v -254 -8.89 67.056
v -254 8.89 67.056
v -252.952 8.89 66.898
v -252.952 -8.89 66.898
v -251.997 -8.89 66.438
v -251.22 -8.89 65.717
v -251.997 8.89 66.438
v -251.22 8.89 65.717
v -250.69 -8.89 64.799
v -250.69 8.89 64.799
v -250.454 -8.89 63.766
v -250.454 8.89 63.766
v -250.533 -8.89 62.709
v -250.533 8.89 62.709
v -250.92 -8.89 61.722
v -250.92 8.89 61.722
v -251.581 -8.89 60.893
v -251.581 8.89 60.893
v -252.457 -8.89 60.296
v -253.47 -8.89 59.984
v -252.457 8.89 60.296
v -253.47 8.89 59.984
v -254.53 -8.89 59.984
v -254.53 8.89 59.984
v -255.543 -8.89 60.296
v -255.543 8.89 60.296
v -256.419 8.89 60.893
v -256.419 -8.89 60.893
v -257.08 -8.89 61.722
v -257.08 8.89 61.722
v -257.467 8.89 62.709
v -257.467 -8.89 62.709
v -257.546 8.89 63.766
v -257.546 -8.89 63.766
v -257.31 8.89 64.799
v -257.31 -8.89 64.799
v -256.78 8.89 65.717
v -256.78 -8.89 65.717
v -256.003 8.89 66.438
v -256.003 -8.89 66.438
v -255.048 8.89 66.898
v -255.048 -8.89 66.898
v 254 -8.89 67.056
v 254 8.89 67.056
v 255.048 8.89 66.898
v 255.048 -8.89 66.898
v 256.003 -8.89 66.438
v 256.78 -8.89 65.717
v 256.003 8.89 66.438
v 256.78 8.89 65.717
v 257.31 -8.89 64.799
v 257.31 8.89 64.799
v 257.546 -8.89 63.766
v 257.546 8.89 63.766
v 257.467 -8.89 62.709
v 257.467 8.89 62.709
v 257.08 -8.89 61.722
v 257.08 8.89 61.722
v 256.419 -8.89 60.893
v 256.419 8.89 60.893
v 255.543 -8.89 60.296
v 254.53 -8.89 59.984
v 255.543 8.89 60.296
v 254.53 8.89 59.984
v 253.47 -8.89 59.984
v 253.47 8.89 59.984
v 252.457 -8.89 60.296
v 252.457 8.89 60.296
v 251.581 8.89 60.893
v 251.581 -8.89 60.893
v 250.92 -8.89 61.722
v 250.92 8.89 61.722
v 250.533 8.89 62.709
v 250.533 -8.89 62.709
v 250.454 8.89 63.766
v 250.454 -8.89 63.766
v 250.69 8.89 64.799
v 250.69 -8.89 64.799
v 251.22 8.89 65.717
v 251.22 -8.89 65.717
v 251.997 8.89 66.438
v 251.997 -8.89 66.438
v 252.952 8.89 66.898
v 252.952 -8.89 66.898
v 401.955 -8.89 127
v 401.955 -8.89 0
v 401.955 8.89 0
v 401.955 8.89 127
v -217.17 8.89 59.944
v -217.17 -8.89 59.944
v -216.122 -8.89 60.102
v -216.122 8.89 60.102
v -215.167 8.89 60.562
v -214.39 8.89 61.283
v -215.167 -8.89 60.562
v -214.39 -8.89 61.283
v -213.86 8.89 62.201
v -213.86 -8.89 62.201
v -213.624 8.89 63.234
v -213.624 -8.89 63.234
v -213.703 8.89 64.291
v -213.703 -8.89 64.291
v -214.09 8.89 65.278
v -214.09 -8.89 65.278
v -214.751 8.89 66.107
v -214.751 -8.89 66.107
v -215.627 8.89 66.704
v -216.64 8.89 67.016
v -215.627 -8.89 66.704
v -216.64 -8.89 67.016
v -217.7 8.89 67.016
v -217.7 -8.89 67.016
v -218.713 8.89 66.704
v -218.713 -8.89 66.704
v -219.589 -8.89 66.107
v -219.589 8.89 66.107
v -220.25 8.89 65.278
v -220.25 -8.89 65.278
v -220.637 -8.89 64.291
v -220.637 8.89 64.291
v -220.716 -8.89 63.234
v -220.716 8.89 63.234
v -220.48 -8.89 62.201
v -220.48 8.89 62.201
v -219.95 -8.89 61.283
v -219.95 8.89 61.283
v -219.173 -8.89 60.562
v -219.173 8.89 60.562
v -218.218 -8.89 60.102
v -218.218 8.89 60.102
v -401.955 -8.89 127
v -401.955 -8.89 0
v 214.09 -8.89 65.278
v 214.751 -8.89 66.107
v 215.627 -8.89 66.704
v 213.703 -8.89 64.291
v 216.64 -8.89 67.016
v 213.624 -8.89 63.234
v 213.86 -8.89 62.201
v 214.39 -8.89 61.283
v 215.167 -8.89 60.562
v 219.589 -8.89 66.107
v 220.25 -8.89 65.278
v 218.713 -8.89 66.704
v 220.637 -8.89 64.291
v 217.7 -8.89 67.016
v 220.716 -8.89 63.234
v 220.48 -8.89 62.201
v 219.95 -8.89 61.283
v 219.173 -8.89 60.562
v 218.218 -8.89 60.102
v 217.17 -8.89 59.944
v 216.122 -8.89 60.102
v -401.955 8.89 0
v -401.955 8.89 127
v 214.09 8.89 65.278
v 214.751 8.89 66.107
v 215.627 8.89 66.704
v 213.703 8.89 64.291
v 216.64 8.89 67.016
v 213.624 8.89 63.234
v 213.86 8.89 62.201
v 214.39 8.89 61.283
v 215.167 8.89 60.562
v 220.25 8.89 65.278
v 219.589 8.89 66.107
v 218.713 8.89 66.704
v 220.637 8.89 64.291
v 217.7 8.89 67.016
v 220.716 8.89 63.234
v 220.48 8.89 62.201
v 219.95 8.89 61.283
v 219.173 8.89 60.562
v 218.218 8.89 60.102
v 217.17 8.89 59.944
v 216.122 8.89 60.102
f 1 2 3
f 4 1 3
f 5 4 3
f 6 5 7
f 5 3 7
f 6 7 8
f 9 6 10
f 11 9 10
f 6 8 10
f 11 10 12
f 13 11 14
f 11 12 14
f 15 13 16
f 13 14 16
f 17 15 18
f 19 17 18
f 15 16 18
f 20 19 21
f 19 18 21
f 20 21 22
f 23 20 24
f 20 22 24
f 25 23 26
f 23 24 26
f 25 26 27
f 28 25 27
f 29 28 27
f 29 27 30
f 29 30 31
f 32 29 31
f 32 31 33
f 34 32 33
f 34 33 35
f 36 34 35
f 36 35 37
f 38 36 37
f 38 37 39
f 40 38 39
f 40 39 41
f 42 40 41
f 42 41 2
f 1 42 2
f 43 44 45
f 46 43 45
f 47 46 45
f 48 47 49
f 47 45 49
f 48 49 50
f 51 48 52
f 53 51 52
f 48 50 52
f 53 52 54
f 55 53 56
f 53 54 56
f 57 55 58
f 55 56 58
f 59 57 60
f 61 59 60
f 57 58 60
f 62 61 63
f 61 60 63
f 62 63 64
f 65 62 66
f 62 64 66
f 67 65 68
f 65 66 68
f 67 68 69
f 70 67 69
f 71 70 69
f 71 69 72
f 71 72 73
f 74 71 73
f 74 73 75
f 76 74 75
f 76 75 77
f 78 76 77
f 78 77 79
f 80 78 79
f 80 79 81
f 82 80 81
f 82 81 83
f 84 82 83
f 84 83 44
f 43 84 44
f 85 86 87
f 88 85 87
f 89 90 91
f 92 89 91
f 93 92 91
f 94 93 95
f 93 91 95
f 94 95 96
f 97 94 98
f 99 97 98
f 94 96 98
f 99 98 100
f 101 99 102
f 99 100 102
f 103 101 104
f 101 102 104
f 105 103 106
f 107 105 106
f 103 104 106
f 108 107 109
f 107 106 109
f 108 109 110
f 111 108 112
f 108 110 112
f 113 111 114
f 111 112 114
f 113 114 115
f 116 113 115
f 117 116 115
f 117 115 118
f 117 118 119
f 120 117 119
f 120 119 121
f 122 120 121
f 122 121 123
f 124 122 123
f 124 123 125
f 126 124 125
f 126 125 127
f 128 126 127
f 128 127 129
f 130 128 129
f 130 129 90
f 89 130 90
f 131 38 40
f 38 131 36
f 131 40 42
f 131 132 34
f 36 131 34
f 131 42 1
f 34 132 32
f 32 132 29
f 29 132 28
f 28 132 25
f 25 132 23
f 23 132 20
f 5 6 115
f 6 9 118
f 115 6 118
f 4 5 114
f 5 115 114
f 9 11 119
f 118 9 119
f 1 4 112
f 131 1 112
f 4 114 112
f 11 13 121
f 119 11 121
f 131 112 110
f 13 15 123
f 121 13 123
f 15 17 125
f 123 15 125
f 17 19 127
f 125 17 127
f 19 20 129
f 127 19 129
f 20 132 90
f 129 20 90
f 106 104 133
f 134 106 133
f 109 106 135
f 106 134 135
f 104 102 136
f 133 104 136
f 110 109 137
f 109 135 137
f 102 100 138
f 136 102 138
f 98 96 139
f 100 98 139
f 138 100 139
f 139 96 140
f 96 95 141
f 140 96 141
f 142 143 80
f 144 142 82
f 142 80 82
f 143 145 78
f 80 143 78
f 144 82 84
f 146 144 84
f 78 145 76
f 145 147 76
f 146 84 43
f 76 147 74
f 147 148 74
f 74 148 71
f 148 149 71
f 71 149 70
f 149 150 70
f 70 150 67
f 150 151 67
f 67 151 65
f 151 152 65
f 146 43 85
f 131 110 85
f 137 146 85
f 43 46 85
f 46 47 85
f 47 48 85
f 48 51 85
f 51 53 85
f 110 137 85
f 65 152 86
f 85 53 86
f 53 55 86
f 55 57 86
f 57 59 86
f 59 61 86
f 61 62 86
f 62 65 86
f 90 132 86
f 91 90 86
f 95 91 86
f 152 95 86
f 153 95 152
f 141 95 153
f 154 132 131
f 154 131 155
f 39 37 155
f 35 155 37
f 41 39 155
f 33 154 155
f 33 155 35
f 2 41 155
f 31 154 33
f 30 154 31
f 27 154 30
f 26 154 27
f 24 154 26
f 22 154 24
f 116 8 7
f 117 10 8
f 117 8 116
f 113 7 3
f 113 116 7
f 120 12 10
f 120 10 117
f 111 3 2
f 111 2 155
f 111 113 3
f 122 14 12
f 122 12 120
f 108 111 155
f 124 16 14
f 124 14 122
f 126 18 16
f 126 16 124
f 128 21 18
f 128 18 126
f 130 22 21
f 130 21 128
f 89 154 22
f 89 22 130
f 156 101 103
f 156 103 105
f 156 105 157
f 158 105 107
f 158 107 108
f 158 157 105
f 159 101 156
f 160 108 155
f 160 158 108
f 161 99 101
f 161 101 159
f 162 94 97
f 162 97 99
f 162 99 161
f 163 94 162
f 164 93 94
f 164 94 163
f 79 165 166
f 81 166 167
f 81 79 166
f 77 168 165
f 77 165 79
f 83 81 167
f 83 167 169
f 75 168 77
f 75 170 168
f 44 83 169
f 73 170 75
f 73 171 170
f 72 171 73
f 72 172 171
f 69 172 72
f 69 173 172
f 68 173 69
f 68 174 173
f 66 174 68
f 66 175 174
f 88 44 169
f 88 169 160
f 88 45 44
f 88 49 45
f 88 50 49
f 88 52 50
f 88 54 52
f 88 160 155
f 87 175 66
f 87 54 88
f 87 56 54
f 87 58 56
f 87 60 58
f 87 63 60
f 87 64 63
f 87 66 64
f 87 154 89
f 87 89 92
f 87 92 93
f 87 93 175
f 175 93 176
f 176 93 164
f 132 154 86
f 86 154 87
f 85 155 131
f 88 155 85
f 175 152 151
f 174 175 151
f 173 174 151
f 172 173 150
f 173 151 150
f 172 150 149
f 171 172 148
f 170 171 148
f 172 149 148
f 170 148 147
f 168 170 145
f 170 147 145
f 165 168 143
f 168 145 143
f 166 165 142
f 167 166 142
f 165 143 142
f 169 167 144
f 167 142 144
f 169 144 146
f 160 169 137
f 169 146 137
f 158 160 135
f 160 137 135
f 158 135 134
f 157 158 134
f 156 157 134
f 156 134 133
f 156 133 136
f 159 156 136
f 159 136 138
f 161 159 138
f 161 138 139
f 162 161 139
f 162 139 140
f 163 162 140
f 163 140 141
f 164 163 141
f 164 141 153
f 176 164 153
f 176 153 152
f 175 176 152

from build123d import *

# Parameters (mm, degrees)
SKETCH3_W           = 803.91
SKETCH3_H           = 17.78
BOSS_EXTRUDE1_DEPTH = 127
SKETCH4_R           = 3.556
CUT_EXTRUDE1_DEPTH  = 422.915809641
SKETCH5_R           = 3.556
CUT_EXTRUDE2_DEPTH  = 422.915809641


with BuildPart() as part:
    # Sketch3 → Boss-Extrude1 (new body)
    with BuildSketch(Plane.XY):
        Rectangle(SKETCH3_W, SKETCH3_H)
    extrude(amount=BOSS_EXTRUDE1_DEPTH)

    # Sketch4 → Cut-Extrude1 (cut, through all)
    with BuildSketch(Plane(origin=(0, 8.89, 0), x_dir=(1, 0, 0), z_dir=(0, 1, 0))):
        with Locations(Location((-254, -63.5, 0), (0, 0, 270))):
            Circle(SKETCH4_R)
        with Locations(Location((254, -63.5, 0), (0, 0, 270))):
            Circle(SKETCH4_R)
    extrude(amount=-CUT_EXTRUDE1_DEPTH, mode=Mode.SUBTRACT)

    # Sketch5 → Cut-Extrude2 (cut, through all)
    with BuildSketch(Plane.XZ.offset(8.89)):
        with Locations(Location((-217.17, 63.5, 0), (0, 0, 270))):
            Circle(SKETCH5_R)
        with Locations(Location((217.17, 63.5, 0), (0, 0, 270))):
            Circle(SKETCH5_R)
    extrude(amount=-CUT_EXTRUDE2_DEPTH, mode=Mode.SUBTRACT)


solid = part.part
